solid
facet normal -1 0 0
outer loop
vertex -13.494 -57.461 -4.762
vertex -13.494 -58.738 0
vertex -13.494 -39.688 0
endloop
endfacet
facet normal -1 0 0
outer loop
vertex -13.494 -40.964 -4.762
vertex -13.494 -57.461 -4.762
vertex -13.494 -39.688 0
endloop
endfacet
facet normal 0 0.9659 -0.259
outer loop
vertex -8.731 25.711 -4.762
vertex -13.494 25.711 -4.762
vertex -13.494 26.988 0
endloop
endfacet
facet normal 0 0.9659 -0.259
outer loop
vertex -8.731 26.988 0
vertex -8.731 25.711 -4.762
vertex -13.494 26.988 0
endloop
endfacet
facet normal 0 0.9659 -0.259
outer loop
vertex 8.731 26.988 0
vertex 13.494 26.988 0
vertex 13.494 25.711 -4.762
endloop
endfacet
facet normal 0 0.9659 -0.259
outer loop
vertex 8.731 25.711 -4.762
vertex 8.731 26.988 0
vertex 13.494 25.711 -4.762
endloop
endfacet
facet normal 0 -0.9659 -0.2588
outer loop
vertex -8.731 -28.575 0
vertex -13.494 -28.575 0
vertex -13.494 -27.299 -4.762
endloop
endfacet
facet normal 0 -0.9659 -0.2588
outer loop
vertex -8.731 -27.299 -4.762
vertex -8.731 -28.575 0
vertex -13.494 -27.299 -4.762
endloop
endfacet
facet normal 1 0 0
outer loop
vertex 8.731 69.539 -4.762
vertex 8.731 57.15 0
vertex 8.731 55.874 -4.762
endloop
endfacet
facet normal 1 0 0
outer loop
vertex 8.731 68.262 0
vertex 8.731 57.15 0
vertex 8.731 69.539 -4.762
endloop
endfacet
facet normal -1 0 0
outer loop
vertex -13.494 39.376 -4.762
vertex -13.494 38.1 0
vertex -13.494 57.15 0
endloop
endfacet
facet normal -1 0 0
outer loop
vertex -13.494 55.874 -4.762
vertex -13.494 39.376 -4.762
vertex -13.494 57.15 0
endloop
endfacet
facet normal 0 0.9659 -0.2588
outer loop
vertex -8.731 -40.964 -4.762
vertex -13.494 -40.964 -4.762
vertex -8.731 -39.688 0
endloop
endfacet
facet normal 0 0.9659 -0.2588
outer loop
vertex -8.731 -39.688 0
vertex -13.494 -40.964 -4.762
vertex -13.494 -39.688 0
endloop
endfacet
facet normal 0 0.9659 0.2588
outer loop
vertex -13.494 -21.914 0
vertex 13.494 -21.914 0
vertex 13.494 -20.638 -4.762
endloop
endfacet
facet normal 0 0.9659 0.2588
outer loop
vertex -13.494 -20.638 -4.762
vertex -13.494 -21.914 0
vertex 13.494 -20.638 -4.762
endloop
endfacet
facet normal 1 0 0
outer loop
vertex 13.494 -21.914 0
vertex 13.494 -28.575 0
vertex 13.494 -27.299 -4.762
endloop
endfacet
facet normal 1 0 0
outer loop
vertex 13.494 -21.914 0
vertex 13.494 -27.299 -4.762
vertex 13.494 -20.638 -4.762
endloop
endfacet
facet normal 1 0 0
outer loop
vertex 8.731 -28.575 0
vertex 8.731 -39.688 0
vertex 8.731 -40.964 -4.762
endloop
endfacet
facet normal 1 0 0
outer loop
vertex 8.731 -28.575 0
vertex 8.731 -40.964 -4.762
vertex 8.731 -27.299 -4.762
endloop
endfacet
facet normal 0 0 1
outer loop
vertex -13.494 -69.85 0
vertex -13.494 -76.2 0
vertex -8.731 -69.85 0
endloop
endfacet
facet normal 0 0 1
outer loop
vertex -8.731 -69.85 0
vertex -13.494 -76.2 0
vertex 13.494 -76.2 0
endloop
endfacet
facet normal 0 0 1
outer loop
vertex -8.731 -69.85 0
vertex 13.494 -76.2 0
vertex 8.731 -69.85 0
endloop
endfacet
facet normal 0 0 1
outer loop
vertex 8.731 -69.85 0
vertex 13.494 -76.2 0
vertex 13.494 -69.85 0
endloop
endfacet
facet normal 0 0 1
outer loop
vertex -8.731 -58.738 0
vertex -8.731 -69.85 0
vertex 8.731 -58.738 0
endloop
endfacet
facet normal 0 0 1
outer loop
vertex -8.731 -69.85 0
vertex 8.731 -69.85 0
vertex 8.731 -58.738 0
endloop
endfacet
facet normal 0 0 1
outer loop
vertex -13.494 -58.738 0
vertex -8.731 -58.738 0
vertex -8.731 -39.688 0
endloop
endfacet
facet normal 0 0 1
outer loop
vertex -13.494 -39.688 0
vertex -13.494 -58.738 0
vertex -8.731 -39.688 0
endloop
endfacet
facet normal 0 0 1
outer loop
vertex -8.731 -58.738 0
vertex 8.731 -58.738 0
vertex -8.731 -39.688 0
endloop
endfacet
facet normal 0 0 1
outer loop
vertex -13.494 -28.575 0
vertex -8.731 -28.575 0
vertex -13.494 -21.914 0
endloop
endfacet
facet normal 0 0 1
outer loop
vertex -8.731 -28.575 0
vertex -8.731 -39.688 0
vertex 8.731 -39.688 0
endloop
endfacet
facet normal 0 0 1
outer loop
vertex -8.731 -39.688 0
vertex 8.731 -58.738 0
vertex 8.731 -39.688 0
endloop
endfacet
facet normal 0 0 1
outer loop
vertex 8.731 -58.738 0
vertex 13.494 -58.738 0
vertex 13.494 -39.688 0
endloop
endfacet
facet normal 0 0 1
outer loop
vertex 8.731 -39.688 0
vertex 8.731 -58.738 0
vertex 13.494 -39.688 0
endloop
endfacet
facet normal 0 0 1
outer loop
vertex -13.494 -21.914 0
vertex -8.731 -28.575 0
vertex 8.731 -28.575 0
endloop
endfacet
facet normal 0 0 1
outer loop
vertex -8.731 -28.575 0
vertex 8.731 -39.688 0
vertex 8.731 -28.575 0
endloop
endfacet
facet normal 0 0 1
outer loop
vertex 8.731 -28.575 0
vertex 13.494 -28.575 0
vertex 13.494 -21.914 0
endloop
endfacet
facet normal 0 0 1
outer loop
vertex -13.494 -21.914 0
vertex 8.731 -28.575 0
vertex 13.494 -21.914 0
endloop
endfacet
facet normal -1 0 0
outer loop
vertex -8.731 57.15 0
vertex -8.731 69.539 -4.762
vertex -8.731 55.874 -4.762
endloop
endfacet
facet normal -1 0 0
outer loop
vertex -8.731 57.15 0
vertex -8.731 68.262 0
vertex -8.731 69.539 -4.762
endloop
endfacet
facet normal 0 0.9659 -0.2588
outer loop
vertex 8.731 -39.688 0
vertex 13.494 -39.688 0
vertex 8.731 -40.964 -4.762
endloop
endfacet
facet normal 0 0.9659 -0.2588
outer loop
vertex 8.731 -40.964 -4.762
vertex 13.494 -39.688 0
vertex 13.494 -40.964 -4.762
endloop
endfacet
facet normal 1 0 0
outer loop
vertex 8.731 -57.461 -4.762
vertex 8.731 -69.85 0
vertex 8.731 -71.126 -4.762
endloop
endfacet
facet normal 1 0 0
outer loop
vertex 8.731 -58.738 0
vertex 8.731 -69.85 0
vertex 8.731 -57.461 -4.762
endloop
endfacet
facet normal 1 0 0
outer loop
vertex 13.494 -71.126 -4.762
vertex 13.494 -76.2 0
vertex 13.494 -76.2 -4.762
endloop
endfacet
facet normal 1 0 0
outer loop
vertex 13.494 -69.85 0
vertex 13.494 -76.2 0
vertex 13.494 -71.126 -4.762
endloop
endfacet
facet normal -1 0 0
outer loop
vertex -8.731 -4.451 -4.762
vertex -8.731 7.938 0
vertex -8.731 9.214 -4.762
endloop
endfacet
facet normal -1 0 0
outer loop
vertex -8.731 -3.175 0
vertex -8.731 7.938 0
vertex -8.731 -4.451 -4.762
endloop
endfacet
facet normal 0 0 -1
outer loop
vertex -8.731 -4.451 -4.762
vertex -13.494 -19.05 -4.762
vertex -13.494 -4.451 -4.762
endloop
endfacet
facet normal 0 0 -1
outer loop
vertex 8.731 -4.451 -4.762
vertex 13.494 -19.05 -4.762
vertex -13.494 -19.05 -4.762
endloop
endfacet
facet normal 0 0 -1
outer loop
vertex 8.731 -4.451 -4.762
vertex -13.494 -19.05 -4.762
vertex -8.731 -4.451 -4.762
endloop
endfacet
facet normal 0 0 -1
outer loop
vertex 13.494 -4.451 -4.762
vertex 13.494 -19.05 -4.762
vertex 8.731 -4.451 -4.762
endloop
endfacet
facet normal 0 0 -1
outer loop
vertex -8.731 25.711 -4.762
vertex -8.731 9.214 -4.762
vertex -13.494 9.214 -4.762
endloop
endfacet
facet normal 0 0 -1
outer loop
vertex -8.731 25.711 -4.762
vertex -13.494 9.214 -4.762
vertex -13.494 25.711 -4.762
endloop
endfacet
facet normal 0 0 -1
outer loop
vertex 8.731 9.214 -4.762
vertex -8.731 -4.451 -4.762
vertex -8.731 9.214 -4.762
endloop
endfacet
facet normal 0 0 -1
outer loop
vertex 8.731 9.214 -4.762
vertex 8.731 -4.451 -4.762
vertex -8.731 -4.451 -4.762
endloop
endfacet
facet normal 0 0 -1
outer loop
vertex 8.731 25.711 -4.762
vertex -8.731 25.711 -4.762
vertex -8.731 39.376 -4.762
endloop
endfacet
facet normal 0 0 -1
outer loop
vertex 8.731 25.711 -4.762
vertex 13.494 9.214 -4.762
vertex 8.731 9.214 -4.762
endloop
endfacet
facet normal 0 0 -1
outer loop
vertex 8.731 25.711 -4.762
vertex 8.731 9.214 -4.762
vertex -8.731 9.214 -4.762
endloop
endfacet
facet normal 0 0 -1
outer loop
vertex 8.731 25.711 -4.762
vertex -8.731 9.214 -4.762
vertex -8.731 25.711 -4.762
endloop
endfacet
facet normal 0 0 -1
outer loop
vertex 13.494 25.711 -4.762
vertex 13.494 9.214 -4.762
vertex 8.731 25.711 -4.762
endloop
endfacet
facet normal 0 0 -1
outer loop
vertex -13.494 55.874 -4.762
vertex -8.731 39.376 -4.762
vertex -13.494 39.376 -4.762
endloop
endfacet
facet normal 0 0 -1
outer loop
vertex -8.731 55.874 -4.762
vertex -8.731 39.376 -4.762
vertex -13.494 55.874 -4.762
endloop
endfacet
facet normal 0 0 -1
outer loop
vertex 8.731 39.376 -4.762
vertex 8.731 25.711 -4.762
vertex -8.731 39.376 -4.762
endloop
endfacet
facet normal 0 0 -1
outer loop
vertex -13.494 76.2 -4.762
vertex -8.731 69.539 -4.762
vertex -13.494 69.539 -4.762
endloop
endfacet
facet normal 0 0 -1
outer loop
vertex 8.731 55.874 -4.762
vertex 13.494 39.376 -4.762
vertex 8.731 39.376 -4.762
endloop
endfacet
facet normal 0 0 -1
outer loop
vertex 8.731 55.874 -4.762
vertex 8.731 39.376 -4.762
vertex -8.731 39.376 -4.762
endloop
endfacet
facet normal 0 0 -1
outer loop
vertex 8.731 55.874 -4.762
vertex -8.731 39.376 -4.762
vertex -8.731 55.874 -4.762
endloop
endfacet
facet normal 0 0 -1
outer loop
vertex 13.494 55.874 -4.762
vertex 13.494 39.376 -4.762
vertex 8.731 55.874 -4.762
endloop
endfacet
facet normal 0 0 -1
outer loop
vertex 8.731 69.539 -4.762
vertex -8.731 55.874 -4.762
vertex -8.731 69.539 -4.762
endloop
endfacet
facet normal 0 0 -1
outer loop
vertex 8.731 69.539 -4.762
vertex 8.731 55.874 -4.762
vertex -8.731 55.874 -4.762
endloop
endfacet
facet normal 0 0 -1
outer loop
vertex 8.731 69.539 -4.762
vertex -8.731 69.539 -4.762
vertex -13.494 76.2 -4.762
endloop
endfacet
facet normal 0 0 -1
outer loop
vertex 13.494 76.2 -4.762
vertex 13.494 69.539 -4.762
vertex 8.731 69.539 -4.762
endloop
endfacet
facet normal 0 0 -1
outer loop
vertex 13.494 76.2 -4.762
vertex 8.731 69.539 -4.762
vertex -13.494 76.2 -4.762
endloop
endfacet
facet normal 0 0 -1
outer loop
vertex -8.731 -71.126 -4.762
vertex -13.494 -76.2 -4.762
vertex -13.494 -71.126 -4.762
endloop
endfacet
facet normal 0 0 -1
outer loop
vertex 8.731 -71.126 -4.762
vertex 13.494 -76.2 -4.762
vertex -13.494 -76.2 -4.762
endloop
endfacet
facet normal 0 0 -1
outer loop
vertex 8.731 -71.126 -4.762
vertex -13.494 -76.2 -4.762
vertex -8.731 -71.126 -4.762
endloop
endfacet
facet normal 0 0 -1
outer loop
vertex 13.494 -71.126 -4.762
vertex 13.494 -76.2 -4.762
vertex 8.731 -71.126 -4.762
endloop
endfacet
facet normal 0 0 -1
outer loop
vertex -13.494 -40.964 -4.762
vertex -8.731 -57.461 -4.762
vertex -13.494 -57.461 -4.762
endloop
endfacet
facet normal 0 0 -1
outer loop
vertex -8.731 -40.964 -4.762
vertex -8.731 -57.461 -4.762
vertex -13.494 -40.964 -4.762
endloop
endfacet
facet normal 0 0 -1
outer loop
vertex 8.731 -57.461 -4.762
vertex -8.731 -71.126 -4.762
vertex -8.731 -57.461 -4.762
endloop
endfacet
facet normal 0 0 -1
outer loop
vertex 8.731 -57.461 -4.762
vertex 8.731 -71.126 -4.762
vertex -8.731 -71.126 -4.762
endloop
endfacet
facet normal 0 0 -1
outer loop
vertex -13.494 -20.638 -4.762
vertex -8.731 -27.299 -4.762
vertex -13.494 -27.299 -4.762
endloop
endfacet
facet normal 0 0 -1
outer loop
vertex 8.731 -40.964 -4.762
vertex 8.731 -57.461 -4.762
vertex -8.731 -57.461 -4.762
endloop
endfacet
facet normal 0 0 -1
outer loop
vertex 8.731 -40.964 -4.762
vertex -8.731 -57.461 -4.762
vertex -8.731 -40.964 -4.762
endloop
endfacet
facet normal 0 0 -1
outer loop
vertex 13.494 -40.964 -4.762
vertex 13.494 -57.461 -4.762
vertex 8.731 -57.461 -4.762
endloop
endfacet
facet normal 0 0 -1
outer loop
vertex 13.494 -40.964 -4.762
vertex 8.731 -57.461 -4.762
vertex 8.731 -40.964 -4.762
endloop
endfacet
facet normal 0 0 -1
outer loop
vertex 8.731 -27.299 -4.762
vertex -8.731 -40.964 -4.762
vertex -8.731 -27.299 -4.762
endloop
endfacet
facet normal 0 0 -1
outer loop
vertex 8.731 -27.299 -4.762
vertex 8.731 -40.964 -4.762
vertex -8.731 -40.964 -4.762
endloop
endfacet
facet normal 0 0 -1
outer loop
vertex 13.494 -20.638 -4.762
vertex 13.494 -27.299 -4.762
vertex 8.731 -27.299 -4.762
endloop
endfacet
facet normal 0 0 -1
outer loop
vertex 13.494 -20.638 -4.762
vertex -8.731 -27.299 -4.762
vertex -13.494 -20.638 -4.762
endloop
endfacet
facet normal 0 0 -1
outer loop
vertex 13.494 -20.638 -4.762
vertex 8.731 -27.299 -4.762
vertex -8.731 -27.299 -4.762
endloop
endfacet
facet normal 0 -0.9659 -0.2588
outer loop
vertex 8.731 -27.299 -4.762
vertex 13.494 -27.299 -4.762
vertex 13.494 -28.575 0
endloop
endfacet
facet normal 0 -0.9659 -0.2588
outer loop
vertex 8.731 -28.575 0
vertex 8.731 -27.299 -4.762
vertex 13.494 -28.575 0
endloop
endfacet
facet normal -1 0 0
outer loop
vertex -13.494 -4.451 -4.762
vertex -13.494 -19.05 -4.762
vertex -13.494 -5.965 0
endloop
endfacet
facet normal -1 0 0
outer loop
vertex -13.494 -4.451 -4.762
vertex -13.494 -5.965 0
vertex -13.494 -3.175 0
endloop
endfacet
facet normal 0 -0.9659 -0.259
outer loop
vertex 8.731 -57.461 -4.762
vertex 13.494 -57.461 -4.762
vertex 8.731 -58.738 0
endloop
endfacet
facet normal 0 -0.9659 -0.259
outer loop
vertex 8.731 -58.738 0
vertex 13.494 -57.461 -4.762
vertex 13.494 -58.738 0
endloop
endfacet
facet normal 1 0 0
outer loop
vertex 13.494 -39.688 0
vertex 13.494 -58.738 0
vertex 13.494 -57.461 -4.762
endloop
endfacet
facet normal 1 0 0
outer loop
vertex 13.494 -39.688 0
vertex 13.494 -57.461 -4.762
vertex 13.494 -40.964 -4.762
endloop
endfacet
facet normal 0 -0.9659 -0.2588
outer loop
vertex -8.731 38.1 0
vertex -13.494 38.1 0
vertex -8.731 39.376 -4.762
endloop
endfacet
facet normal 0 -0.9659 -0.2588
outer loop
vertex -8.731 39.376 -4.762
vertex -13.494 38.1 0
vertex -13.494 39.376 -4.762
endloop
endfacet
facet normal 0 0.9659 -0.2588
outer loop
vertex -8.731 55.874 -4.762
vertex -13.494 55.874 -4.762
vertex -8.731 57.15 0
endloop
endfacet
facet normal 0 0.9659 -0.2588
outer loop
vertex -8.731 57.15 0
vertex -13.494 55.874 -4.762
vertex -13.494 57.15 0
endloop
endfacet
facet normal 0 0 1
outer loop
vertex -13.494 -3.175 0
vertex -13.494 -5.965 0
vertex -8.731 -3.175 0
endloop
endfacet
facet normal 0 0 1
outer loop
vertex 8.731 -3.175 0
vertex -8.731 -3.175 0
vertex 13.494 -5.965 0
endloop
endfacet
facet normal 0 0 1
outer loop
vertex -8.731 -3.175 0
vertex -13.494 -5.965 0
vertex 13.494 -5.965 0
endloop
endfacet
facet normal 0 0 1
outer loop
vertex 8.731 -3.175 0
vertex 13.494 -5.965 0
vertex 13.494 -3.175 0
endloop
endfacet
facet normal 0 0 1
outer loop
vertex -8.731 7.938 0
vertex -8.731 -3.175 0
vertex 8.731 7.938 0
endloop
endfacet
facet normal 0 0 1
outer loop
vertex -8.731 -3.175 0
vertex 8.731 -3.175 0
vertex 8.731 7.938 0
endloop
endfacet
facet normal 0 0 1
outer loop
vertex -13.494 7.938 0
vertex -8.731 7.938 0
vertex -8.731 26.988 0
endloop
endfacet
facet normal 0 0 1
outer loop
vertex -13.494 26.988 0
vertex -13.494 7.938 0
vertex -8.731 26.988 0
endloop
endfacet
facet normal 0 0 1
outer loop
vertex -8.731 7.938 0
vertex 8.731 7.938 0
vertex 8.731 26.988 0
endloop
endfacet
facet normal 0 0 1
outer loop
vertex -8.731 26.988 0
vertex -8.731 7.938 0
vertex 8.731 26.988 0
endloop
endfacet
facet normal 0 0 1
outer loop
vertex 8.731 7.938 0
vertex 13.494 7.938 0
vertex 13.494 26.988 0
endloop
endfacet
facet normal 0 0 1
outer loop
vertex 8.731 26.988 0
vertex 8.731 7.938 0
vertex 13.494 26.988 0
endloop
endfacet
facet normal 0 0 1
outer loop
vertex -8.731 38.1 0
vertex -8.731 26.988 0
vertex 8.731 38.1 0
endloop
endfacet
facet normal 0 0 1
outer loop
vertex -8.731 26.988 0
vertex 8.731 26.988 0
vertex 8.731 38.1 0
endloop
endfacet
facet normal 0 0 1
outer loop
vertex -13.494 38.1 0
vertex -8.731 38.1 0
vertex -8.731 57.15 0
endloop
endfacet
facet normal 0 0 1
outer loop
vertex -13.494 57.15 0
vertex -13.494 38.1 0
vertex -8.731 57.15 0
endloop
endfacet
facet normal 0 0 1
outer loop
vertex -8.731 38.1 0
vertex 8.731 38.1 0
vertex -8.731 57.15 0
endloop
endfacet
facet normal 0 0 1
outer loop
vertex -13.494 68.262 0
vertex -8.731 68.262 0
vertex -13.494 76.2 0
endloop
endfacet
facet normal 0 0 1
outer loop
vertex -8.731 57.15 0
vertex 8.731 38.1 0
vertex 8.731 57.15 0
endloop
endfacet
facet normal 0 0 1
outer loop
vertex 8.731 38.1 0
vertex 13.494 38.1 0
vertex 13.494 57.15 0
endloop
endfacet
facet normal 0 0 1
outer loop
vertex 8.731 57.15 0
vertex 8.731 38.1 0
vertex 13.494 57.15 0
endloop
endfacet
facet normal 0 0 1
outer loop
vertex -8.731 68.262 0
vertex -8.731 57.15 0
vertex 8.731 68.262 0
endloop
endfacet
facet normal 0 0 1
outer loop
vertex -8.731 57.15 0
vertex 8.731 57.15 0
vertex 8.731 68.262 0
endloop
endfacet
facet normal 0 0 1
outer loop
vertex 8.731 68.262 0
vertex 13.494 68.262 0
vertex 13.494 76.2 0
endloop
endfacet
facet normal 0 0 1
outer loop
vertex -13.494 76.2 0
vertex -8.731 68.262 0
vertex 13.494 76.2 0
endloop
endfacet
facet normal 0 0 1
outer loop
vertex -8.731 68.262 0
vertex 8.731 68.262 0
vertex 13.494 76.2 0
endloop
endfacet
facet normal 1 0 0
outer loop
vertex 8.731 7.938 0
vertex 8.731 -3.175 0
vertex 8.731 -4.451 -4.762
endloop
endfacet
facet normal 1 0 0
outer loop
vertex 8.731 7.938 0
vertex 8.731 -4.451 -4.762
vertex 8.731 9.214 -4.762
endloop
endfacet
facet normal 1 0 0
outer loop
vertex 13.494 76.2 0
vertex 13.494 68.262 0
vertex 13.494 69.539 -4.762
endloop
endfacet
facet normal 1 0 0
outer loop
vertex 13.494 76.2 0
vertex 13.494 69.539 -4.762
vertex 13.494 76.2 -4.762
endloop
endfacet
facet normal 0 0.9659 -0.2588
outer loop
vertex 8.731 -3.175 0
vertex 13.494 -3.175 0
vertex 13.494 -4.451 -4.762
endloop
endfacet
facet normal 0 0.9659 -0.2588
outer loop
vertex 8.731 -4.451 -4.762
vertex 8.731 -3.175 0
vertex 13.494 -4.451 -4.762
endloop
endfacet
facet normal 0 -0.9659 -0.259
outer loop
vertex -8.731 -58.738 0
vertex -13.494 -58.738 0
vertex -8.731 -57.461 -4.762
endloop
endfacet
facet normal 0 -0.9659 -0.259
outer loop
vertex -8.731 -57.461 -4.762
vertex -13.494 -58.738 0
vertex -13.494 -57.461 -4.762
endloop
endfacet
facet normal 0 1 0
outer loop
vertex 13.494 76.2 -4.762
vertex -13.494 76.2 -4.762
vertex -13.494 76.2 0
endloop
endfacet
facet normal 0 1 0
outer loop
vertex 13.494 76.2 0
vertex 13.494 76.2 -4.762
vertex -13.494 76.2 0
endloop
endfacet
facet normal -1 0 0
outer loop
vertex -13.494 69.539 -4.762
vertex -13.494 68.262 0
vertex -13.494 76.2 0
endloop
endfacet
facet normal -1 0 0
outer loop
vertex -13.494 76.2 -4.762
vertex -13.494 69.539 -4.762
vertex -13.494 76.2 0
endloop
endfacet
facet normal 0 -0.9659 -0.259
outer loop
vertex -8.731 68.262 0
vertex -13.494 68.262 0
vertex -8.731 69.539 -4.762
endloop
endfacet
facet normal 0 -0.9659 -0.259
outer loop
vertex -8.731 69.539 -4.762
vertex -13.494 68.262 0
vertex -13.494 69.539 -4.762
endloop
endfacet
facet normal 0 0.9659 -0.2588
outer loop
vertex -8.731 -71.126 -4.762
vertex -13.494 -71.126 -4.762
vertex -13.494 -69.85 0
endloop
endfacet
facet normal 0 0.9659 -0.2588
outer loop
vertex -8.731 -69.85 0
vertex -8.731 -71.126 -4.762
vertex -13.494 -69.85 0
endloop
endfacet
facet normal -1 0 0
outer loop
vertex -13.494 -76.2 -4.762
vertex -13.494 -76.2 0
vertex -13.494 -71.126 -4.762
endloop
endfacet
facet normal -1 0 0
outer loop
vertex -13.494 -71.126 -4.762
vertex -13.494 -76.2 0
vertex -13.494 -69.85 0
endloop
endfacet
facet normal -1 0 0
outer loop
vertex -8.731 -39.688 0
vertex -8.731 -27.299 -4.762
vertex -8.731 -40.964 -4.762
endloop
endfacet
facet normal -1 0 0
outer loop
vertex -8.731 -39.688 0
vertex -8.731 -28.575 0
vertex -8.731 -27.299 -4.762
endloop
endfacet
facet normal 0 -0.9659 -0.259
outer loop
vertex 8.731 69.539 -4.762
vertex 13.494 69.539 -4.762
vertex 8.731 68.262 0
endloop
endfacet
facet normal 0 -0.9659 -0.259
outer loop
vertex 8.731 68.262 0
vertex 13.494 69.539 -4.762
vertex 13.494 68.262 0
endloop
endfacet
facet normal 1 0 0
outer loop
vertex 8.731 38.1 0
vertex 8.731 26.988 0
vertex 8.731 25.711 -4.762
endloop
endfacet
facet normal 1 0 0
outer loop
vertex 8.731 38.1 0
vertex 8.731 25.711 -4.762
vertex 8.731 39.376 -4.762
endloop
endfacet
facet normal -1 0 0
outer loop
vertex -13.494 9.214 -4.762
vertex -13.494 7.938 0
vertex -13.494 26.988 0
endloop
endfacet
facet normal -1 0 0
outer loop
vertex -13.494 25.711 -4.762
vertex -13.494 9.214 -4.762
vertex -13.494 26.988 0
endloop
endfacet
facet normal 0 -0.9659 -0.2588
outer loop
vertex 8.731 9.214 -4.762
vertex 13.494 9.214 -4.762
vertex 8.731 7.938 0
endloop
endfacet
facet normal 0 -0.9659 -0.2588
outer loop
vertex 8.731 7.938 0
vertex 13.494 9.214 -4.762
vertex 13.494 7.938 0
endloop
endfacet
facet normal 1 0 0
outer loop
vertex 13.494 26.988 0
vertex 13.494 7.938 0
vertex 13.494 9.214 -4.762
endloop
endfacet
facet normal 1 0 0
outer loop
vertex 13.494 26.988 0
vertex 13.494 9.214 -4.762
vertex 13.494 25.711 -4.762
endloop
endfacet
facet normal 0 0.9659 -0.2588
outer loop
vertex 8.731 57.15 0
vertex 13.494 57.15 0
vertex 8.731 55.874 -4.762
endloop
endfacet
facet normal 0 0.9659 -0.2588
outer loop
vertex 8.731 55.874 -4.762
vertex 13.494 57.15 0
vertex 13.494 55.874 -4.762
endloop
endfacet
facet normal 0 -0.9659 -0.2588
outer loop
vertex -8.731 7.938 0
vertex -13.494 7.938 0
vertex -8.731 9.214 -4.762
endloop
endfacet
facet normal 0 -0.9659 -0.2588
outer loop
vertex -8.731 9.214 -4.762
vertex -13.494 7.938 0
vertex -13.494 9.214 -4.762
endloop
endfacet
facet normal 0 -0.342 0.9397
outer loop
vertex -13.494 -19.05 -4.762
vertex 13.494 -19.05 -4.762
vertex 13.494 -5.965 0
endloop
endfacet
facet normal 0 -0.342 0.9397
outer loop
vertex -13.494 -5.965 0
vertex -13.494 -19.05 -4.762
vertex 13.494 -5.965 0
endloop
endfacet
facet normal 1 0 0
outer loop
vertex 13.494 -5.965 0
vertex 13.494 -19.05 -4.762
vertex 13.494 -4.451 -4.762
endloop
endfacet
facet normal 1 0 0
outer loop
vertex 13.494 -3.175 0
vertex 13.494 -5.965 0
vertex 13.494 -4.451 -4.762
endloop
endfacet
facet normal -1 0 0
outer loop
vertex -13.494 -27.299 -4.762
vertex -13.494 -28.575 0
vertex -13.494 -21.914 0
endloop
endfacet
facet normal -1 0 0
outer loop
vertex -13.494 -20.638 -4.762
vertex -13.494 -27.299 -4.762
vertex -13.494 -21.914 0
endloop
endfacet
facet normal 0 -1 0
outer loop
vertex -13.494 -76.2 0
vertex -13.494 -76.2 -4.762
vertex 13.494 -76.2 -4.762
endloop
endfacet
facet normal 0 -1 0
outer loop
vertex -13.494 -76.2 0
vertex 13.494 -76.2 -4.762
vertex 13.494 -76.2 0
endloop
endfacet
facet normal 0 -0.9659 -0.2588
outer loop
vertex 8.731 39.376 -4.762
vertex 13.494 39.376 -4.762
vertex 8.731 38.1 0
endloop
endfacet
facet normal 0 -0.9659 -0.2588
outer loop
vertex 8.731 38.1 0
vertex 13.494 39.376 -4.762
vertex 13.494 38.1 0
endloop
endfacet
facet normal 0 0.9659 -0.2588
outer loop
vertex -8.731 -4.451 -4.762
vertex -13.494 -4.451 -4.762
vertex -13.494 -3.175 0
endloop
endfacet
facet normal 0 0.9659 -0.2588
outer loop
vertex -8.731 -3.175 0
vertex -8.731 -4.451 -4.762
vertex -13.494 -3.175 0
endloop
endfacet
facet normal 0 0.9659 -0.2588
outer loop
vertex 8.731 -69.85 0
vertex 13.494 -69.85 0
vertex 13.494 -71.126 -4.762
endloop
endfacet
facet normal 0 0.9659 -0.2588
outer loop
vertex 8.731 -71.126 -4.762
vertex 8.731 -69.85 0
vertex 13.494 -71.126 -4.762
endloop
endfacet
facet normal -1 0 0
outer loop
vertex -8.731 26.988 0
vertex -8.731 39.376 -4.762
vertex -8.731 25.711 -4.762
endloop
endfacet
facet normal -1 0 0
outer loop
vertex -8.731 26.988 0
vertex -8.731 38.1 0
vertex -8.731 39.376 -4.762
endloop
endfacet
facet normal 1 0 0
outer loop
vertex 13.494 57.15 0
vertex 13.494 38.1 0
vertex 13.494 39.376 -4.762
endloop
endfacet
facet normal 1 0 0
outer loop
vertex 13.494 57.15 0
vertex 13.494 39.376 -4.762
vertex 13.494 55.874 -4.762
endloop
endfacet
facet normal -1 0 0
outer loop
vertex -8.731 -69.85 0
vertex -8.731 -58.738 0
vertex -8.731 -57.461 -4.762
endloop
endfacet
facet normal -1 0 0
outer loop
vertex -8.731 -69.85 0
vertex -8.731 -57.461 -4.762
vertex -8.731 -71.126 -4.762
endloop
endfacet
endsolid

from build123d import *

# Parameters (mm, degrees)
F0_W     = 152.4
F0_H     = 4.7625
F1_DEPTH = 13.49375
F3_DEPTH = 4.7625
F5_DEPTH = 4.7625
F7_DEPTH = 26.9885


with BuildPart() as f1:
    # F0 (on Right) → F1 (new body, symmetric)
    with BuildSketch(Plane.YZ):
        with Locations((0, -2.38125)):
            Rectangle(F0_W, F0_H)
    extrude(amount=F1_DEPTH, both=True)

    # F2 (on face) → F3 (cut)
    with BuildSketch(Plane.YZ.offset(13.49375)):
        Polygon((-58.7375, 0), (-69.85, 0), (-71.126108, -4.7625), (-57.461392, -4.7625), align=None)
        Polygon((-28.575, 0), (-39.6875, 0), (-40.963608, -4.7625), (-27.298892, -4.7625), align=None)
        Polygon((7.9375, 0), (-3.175, 0), (-4.451108, -4.7625), (9.213608, -4.7625), align=None)
        Polygon((38.1, 0), (26.9875, 0), (25.711392, -4.7625), (39.376108, -4.7625), align=None)
        Polygon((68.2625, 0), (57.15, 0), (55.873892, -4.7625), (69.538608, -4.7625), align=None)
    extrude(amount=-F3_DEPTH, mode=Mode.SUBTRACT)

    # F4 (on face) → F5 (cut)
    with BuildSketch(Plane(origin=(-13.49375, 0, 0), x_dir=(0, -1, 0), z_dir=(-1, 0, 0))):
        Polygon((-69.538608, -4.7625), (-55.873892, -4.7625), (-57.15, 0), (-68.2625, 0), align=None)
        Polygon((-39.376108, -4.7625), (-25.711392, -4.7625), (-26.9875, 0), (-38.1, 0), align=None)
        Polygon((-9.213608, -4.7625), (4.451108, -4.7625), (3.175, 0), (-7.9375, 0), align=None)
        Polygon((27.298892, -4.7625), (40.963608, -4.7625), (39.6875, 0), (28.575, 0), align=None)
        Polygon((58.7375, 0), (57.461392, -4.7625), (71.126108, -4.7625), (69.85, 0), align=None)
    extrude(amount=-F5_DEPTH, mode=Mode.SUBTRACT)

    # F6 (on face) → F7 (cut, through all)
    with BuildSketch(Plane.YZ.offset(13.49375)):
        Polygon((-19.05, -4.7625), (-5.965139, 0), (-21.913608, 0), (-20.6375, -4.7625), align=None)
    extrude(amount=-F7_DEPTH, mode=Mode.SUBTRACT)


solid = f1.part
